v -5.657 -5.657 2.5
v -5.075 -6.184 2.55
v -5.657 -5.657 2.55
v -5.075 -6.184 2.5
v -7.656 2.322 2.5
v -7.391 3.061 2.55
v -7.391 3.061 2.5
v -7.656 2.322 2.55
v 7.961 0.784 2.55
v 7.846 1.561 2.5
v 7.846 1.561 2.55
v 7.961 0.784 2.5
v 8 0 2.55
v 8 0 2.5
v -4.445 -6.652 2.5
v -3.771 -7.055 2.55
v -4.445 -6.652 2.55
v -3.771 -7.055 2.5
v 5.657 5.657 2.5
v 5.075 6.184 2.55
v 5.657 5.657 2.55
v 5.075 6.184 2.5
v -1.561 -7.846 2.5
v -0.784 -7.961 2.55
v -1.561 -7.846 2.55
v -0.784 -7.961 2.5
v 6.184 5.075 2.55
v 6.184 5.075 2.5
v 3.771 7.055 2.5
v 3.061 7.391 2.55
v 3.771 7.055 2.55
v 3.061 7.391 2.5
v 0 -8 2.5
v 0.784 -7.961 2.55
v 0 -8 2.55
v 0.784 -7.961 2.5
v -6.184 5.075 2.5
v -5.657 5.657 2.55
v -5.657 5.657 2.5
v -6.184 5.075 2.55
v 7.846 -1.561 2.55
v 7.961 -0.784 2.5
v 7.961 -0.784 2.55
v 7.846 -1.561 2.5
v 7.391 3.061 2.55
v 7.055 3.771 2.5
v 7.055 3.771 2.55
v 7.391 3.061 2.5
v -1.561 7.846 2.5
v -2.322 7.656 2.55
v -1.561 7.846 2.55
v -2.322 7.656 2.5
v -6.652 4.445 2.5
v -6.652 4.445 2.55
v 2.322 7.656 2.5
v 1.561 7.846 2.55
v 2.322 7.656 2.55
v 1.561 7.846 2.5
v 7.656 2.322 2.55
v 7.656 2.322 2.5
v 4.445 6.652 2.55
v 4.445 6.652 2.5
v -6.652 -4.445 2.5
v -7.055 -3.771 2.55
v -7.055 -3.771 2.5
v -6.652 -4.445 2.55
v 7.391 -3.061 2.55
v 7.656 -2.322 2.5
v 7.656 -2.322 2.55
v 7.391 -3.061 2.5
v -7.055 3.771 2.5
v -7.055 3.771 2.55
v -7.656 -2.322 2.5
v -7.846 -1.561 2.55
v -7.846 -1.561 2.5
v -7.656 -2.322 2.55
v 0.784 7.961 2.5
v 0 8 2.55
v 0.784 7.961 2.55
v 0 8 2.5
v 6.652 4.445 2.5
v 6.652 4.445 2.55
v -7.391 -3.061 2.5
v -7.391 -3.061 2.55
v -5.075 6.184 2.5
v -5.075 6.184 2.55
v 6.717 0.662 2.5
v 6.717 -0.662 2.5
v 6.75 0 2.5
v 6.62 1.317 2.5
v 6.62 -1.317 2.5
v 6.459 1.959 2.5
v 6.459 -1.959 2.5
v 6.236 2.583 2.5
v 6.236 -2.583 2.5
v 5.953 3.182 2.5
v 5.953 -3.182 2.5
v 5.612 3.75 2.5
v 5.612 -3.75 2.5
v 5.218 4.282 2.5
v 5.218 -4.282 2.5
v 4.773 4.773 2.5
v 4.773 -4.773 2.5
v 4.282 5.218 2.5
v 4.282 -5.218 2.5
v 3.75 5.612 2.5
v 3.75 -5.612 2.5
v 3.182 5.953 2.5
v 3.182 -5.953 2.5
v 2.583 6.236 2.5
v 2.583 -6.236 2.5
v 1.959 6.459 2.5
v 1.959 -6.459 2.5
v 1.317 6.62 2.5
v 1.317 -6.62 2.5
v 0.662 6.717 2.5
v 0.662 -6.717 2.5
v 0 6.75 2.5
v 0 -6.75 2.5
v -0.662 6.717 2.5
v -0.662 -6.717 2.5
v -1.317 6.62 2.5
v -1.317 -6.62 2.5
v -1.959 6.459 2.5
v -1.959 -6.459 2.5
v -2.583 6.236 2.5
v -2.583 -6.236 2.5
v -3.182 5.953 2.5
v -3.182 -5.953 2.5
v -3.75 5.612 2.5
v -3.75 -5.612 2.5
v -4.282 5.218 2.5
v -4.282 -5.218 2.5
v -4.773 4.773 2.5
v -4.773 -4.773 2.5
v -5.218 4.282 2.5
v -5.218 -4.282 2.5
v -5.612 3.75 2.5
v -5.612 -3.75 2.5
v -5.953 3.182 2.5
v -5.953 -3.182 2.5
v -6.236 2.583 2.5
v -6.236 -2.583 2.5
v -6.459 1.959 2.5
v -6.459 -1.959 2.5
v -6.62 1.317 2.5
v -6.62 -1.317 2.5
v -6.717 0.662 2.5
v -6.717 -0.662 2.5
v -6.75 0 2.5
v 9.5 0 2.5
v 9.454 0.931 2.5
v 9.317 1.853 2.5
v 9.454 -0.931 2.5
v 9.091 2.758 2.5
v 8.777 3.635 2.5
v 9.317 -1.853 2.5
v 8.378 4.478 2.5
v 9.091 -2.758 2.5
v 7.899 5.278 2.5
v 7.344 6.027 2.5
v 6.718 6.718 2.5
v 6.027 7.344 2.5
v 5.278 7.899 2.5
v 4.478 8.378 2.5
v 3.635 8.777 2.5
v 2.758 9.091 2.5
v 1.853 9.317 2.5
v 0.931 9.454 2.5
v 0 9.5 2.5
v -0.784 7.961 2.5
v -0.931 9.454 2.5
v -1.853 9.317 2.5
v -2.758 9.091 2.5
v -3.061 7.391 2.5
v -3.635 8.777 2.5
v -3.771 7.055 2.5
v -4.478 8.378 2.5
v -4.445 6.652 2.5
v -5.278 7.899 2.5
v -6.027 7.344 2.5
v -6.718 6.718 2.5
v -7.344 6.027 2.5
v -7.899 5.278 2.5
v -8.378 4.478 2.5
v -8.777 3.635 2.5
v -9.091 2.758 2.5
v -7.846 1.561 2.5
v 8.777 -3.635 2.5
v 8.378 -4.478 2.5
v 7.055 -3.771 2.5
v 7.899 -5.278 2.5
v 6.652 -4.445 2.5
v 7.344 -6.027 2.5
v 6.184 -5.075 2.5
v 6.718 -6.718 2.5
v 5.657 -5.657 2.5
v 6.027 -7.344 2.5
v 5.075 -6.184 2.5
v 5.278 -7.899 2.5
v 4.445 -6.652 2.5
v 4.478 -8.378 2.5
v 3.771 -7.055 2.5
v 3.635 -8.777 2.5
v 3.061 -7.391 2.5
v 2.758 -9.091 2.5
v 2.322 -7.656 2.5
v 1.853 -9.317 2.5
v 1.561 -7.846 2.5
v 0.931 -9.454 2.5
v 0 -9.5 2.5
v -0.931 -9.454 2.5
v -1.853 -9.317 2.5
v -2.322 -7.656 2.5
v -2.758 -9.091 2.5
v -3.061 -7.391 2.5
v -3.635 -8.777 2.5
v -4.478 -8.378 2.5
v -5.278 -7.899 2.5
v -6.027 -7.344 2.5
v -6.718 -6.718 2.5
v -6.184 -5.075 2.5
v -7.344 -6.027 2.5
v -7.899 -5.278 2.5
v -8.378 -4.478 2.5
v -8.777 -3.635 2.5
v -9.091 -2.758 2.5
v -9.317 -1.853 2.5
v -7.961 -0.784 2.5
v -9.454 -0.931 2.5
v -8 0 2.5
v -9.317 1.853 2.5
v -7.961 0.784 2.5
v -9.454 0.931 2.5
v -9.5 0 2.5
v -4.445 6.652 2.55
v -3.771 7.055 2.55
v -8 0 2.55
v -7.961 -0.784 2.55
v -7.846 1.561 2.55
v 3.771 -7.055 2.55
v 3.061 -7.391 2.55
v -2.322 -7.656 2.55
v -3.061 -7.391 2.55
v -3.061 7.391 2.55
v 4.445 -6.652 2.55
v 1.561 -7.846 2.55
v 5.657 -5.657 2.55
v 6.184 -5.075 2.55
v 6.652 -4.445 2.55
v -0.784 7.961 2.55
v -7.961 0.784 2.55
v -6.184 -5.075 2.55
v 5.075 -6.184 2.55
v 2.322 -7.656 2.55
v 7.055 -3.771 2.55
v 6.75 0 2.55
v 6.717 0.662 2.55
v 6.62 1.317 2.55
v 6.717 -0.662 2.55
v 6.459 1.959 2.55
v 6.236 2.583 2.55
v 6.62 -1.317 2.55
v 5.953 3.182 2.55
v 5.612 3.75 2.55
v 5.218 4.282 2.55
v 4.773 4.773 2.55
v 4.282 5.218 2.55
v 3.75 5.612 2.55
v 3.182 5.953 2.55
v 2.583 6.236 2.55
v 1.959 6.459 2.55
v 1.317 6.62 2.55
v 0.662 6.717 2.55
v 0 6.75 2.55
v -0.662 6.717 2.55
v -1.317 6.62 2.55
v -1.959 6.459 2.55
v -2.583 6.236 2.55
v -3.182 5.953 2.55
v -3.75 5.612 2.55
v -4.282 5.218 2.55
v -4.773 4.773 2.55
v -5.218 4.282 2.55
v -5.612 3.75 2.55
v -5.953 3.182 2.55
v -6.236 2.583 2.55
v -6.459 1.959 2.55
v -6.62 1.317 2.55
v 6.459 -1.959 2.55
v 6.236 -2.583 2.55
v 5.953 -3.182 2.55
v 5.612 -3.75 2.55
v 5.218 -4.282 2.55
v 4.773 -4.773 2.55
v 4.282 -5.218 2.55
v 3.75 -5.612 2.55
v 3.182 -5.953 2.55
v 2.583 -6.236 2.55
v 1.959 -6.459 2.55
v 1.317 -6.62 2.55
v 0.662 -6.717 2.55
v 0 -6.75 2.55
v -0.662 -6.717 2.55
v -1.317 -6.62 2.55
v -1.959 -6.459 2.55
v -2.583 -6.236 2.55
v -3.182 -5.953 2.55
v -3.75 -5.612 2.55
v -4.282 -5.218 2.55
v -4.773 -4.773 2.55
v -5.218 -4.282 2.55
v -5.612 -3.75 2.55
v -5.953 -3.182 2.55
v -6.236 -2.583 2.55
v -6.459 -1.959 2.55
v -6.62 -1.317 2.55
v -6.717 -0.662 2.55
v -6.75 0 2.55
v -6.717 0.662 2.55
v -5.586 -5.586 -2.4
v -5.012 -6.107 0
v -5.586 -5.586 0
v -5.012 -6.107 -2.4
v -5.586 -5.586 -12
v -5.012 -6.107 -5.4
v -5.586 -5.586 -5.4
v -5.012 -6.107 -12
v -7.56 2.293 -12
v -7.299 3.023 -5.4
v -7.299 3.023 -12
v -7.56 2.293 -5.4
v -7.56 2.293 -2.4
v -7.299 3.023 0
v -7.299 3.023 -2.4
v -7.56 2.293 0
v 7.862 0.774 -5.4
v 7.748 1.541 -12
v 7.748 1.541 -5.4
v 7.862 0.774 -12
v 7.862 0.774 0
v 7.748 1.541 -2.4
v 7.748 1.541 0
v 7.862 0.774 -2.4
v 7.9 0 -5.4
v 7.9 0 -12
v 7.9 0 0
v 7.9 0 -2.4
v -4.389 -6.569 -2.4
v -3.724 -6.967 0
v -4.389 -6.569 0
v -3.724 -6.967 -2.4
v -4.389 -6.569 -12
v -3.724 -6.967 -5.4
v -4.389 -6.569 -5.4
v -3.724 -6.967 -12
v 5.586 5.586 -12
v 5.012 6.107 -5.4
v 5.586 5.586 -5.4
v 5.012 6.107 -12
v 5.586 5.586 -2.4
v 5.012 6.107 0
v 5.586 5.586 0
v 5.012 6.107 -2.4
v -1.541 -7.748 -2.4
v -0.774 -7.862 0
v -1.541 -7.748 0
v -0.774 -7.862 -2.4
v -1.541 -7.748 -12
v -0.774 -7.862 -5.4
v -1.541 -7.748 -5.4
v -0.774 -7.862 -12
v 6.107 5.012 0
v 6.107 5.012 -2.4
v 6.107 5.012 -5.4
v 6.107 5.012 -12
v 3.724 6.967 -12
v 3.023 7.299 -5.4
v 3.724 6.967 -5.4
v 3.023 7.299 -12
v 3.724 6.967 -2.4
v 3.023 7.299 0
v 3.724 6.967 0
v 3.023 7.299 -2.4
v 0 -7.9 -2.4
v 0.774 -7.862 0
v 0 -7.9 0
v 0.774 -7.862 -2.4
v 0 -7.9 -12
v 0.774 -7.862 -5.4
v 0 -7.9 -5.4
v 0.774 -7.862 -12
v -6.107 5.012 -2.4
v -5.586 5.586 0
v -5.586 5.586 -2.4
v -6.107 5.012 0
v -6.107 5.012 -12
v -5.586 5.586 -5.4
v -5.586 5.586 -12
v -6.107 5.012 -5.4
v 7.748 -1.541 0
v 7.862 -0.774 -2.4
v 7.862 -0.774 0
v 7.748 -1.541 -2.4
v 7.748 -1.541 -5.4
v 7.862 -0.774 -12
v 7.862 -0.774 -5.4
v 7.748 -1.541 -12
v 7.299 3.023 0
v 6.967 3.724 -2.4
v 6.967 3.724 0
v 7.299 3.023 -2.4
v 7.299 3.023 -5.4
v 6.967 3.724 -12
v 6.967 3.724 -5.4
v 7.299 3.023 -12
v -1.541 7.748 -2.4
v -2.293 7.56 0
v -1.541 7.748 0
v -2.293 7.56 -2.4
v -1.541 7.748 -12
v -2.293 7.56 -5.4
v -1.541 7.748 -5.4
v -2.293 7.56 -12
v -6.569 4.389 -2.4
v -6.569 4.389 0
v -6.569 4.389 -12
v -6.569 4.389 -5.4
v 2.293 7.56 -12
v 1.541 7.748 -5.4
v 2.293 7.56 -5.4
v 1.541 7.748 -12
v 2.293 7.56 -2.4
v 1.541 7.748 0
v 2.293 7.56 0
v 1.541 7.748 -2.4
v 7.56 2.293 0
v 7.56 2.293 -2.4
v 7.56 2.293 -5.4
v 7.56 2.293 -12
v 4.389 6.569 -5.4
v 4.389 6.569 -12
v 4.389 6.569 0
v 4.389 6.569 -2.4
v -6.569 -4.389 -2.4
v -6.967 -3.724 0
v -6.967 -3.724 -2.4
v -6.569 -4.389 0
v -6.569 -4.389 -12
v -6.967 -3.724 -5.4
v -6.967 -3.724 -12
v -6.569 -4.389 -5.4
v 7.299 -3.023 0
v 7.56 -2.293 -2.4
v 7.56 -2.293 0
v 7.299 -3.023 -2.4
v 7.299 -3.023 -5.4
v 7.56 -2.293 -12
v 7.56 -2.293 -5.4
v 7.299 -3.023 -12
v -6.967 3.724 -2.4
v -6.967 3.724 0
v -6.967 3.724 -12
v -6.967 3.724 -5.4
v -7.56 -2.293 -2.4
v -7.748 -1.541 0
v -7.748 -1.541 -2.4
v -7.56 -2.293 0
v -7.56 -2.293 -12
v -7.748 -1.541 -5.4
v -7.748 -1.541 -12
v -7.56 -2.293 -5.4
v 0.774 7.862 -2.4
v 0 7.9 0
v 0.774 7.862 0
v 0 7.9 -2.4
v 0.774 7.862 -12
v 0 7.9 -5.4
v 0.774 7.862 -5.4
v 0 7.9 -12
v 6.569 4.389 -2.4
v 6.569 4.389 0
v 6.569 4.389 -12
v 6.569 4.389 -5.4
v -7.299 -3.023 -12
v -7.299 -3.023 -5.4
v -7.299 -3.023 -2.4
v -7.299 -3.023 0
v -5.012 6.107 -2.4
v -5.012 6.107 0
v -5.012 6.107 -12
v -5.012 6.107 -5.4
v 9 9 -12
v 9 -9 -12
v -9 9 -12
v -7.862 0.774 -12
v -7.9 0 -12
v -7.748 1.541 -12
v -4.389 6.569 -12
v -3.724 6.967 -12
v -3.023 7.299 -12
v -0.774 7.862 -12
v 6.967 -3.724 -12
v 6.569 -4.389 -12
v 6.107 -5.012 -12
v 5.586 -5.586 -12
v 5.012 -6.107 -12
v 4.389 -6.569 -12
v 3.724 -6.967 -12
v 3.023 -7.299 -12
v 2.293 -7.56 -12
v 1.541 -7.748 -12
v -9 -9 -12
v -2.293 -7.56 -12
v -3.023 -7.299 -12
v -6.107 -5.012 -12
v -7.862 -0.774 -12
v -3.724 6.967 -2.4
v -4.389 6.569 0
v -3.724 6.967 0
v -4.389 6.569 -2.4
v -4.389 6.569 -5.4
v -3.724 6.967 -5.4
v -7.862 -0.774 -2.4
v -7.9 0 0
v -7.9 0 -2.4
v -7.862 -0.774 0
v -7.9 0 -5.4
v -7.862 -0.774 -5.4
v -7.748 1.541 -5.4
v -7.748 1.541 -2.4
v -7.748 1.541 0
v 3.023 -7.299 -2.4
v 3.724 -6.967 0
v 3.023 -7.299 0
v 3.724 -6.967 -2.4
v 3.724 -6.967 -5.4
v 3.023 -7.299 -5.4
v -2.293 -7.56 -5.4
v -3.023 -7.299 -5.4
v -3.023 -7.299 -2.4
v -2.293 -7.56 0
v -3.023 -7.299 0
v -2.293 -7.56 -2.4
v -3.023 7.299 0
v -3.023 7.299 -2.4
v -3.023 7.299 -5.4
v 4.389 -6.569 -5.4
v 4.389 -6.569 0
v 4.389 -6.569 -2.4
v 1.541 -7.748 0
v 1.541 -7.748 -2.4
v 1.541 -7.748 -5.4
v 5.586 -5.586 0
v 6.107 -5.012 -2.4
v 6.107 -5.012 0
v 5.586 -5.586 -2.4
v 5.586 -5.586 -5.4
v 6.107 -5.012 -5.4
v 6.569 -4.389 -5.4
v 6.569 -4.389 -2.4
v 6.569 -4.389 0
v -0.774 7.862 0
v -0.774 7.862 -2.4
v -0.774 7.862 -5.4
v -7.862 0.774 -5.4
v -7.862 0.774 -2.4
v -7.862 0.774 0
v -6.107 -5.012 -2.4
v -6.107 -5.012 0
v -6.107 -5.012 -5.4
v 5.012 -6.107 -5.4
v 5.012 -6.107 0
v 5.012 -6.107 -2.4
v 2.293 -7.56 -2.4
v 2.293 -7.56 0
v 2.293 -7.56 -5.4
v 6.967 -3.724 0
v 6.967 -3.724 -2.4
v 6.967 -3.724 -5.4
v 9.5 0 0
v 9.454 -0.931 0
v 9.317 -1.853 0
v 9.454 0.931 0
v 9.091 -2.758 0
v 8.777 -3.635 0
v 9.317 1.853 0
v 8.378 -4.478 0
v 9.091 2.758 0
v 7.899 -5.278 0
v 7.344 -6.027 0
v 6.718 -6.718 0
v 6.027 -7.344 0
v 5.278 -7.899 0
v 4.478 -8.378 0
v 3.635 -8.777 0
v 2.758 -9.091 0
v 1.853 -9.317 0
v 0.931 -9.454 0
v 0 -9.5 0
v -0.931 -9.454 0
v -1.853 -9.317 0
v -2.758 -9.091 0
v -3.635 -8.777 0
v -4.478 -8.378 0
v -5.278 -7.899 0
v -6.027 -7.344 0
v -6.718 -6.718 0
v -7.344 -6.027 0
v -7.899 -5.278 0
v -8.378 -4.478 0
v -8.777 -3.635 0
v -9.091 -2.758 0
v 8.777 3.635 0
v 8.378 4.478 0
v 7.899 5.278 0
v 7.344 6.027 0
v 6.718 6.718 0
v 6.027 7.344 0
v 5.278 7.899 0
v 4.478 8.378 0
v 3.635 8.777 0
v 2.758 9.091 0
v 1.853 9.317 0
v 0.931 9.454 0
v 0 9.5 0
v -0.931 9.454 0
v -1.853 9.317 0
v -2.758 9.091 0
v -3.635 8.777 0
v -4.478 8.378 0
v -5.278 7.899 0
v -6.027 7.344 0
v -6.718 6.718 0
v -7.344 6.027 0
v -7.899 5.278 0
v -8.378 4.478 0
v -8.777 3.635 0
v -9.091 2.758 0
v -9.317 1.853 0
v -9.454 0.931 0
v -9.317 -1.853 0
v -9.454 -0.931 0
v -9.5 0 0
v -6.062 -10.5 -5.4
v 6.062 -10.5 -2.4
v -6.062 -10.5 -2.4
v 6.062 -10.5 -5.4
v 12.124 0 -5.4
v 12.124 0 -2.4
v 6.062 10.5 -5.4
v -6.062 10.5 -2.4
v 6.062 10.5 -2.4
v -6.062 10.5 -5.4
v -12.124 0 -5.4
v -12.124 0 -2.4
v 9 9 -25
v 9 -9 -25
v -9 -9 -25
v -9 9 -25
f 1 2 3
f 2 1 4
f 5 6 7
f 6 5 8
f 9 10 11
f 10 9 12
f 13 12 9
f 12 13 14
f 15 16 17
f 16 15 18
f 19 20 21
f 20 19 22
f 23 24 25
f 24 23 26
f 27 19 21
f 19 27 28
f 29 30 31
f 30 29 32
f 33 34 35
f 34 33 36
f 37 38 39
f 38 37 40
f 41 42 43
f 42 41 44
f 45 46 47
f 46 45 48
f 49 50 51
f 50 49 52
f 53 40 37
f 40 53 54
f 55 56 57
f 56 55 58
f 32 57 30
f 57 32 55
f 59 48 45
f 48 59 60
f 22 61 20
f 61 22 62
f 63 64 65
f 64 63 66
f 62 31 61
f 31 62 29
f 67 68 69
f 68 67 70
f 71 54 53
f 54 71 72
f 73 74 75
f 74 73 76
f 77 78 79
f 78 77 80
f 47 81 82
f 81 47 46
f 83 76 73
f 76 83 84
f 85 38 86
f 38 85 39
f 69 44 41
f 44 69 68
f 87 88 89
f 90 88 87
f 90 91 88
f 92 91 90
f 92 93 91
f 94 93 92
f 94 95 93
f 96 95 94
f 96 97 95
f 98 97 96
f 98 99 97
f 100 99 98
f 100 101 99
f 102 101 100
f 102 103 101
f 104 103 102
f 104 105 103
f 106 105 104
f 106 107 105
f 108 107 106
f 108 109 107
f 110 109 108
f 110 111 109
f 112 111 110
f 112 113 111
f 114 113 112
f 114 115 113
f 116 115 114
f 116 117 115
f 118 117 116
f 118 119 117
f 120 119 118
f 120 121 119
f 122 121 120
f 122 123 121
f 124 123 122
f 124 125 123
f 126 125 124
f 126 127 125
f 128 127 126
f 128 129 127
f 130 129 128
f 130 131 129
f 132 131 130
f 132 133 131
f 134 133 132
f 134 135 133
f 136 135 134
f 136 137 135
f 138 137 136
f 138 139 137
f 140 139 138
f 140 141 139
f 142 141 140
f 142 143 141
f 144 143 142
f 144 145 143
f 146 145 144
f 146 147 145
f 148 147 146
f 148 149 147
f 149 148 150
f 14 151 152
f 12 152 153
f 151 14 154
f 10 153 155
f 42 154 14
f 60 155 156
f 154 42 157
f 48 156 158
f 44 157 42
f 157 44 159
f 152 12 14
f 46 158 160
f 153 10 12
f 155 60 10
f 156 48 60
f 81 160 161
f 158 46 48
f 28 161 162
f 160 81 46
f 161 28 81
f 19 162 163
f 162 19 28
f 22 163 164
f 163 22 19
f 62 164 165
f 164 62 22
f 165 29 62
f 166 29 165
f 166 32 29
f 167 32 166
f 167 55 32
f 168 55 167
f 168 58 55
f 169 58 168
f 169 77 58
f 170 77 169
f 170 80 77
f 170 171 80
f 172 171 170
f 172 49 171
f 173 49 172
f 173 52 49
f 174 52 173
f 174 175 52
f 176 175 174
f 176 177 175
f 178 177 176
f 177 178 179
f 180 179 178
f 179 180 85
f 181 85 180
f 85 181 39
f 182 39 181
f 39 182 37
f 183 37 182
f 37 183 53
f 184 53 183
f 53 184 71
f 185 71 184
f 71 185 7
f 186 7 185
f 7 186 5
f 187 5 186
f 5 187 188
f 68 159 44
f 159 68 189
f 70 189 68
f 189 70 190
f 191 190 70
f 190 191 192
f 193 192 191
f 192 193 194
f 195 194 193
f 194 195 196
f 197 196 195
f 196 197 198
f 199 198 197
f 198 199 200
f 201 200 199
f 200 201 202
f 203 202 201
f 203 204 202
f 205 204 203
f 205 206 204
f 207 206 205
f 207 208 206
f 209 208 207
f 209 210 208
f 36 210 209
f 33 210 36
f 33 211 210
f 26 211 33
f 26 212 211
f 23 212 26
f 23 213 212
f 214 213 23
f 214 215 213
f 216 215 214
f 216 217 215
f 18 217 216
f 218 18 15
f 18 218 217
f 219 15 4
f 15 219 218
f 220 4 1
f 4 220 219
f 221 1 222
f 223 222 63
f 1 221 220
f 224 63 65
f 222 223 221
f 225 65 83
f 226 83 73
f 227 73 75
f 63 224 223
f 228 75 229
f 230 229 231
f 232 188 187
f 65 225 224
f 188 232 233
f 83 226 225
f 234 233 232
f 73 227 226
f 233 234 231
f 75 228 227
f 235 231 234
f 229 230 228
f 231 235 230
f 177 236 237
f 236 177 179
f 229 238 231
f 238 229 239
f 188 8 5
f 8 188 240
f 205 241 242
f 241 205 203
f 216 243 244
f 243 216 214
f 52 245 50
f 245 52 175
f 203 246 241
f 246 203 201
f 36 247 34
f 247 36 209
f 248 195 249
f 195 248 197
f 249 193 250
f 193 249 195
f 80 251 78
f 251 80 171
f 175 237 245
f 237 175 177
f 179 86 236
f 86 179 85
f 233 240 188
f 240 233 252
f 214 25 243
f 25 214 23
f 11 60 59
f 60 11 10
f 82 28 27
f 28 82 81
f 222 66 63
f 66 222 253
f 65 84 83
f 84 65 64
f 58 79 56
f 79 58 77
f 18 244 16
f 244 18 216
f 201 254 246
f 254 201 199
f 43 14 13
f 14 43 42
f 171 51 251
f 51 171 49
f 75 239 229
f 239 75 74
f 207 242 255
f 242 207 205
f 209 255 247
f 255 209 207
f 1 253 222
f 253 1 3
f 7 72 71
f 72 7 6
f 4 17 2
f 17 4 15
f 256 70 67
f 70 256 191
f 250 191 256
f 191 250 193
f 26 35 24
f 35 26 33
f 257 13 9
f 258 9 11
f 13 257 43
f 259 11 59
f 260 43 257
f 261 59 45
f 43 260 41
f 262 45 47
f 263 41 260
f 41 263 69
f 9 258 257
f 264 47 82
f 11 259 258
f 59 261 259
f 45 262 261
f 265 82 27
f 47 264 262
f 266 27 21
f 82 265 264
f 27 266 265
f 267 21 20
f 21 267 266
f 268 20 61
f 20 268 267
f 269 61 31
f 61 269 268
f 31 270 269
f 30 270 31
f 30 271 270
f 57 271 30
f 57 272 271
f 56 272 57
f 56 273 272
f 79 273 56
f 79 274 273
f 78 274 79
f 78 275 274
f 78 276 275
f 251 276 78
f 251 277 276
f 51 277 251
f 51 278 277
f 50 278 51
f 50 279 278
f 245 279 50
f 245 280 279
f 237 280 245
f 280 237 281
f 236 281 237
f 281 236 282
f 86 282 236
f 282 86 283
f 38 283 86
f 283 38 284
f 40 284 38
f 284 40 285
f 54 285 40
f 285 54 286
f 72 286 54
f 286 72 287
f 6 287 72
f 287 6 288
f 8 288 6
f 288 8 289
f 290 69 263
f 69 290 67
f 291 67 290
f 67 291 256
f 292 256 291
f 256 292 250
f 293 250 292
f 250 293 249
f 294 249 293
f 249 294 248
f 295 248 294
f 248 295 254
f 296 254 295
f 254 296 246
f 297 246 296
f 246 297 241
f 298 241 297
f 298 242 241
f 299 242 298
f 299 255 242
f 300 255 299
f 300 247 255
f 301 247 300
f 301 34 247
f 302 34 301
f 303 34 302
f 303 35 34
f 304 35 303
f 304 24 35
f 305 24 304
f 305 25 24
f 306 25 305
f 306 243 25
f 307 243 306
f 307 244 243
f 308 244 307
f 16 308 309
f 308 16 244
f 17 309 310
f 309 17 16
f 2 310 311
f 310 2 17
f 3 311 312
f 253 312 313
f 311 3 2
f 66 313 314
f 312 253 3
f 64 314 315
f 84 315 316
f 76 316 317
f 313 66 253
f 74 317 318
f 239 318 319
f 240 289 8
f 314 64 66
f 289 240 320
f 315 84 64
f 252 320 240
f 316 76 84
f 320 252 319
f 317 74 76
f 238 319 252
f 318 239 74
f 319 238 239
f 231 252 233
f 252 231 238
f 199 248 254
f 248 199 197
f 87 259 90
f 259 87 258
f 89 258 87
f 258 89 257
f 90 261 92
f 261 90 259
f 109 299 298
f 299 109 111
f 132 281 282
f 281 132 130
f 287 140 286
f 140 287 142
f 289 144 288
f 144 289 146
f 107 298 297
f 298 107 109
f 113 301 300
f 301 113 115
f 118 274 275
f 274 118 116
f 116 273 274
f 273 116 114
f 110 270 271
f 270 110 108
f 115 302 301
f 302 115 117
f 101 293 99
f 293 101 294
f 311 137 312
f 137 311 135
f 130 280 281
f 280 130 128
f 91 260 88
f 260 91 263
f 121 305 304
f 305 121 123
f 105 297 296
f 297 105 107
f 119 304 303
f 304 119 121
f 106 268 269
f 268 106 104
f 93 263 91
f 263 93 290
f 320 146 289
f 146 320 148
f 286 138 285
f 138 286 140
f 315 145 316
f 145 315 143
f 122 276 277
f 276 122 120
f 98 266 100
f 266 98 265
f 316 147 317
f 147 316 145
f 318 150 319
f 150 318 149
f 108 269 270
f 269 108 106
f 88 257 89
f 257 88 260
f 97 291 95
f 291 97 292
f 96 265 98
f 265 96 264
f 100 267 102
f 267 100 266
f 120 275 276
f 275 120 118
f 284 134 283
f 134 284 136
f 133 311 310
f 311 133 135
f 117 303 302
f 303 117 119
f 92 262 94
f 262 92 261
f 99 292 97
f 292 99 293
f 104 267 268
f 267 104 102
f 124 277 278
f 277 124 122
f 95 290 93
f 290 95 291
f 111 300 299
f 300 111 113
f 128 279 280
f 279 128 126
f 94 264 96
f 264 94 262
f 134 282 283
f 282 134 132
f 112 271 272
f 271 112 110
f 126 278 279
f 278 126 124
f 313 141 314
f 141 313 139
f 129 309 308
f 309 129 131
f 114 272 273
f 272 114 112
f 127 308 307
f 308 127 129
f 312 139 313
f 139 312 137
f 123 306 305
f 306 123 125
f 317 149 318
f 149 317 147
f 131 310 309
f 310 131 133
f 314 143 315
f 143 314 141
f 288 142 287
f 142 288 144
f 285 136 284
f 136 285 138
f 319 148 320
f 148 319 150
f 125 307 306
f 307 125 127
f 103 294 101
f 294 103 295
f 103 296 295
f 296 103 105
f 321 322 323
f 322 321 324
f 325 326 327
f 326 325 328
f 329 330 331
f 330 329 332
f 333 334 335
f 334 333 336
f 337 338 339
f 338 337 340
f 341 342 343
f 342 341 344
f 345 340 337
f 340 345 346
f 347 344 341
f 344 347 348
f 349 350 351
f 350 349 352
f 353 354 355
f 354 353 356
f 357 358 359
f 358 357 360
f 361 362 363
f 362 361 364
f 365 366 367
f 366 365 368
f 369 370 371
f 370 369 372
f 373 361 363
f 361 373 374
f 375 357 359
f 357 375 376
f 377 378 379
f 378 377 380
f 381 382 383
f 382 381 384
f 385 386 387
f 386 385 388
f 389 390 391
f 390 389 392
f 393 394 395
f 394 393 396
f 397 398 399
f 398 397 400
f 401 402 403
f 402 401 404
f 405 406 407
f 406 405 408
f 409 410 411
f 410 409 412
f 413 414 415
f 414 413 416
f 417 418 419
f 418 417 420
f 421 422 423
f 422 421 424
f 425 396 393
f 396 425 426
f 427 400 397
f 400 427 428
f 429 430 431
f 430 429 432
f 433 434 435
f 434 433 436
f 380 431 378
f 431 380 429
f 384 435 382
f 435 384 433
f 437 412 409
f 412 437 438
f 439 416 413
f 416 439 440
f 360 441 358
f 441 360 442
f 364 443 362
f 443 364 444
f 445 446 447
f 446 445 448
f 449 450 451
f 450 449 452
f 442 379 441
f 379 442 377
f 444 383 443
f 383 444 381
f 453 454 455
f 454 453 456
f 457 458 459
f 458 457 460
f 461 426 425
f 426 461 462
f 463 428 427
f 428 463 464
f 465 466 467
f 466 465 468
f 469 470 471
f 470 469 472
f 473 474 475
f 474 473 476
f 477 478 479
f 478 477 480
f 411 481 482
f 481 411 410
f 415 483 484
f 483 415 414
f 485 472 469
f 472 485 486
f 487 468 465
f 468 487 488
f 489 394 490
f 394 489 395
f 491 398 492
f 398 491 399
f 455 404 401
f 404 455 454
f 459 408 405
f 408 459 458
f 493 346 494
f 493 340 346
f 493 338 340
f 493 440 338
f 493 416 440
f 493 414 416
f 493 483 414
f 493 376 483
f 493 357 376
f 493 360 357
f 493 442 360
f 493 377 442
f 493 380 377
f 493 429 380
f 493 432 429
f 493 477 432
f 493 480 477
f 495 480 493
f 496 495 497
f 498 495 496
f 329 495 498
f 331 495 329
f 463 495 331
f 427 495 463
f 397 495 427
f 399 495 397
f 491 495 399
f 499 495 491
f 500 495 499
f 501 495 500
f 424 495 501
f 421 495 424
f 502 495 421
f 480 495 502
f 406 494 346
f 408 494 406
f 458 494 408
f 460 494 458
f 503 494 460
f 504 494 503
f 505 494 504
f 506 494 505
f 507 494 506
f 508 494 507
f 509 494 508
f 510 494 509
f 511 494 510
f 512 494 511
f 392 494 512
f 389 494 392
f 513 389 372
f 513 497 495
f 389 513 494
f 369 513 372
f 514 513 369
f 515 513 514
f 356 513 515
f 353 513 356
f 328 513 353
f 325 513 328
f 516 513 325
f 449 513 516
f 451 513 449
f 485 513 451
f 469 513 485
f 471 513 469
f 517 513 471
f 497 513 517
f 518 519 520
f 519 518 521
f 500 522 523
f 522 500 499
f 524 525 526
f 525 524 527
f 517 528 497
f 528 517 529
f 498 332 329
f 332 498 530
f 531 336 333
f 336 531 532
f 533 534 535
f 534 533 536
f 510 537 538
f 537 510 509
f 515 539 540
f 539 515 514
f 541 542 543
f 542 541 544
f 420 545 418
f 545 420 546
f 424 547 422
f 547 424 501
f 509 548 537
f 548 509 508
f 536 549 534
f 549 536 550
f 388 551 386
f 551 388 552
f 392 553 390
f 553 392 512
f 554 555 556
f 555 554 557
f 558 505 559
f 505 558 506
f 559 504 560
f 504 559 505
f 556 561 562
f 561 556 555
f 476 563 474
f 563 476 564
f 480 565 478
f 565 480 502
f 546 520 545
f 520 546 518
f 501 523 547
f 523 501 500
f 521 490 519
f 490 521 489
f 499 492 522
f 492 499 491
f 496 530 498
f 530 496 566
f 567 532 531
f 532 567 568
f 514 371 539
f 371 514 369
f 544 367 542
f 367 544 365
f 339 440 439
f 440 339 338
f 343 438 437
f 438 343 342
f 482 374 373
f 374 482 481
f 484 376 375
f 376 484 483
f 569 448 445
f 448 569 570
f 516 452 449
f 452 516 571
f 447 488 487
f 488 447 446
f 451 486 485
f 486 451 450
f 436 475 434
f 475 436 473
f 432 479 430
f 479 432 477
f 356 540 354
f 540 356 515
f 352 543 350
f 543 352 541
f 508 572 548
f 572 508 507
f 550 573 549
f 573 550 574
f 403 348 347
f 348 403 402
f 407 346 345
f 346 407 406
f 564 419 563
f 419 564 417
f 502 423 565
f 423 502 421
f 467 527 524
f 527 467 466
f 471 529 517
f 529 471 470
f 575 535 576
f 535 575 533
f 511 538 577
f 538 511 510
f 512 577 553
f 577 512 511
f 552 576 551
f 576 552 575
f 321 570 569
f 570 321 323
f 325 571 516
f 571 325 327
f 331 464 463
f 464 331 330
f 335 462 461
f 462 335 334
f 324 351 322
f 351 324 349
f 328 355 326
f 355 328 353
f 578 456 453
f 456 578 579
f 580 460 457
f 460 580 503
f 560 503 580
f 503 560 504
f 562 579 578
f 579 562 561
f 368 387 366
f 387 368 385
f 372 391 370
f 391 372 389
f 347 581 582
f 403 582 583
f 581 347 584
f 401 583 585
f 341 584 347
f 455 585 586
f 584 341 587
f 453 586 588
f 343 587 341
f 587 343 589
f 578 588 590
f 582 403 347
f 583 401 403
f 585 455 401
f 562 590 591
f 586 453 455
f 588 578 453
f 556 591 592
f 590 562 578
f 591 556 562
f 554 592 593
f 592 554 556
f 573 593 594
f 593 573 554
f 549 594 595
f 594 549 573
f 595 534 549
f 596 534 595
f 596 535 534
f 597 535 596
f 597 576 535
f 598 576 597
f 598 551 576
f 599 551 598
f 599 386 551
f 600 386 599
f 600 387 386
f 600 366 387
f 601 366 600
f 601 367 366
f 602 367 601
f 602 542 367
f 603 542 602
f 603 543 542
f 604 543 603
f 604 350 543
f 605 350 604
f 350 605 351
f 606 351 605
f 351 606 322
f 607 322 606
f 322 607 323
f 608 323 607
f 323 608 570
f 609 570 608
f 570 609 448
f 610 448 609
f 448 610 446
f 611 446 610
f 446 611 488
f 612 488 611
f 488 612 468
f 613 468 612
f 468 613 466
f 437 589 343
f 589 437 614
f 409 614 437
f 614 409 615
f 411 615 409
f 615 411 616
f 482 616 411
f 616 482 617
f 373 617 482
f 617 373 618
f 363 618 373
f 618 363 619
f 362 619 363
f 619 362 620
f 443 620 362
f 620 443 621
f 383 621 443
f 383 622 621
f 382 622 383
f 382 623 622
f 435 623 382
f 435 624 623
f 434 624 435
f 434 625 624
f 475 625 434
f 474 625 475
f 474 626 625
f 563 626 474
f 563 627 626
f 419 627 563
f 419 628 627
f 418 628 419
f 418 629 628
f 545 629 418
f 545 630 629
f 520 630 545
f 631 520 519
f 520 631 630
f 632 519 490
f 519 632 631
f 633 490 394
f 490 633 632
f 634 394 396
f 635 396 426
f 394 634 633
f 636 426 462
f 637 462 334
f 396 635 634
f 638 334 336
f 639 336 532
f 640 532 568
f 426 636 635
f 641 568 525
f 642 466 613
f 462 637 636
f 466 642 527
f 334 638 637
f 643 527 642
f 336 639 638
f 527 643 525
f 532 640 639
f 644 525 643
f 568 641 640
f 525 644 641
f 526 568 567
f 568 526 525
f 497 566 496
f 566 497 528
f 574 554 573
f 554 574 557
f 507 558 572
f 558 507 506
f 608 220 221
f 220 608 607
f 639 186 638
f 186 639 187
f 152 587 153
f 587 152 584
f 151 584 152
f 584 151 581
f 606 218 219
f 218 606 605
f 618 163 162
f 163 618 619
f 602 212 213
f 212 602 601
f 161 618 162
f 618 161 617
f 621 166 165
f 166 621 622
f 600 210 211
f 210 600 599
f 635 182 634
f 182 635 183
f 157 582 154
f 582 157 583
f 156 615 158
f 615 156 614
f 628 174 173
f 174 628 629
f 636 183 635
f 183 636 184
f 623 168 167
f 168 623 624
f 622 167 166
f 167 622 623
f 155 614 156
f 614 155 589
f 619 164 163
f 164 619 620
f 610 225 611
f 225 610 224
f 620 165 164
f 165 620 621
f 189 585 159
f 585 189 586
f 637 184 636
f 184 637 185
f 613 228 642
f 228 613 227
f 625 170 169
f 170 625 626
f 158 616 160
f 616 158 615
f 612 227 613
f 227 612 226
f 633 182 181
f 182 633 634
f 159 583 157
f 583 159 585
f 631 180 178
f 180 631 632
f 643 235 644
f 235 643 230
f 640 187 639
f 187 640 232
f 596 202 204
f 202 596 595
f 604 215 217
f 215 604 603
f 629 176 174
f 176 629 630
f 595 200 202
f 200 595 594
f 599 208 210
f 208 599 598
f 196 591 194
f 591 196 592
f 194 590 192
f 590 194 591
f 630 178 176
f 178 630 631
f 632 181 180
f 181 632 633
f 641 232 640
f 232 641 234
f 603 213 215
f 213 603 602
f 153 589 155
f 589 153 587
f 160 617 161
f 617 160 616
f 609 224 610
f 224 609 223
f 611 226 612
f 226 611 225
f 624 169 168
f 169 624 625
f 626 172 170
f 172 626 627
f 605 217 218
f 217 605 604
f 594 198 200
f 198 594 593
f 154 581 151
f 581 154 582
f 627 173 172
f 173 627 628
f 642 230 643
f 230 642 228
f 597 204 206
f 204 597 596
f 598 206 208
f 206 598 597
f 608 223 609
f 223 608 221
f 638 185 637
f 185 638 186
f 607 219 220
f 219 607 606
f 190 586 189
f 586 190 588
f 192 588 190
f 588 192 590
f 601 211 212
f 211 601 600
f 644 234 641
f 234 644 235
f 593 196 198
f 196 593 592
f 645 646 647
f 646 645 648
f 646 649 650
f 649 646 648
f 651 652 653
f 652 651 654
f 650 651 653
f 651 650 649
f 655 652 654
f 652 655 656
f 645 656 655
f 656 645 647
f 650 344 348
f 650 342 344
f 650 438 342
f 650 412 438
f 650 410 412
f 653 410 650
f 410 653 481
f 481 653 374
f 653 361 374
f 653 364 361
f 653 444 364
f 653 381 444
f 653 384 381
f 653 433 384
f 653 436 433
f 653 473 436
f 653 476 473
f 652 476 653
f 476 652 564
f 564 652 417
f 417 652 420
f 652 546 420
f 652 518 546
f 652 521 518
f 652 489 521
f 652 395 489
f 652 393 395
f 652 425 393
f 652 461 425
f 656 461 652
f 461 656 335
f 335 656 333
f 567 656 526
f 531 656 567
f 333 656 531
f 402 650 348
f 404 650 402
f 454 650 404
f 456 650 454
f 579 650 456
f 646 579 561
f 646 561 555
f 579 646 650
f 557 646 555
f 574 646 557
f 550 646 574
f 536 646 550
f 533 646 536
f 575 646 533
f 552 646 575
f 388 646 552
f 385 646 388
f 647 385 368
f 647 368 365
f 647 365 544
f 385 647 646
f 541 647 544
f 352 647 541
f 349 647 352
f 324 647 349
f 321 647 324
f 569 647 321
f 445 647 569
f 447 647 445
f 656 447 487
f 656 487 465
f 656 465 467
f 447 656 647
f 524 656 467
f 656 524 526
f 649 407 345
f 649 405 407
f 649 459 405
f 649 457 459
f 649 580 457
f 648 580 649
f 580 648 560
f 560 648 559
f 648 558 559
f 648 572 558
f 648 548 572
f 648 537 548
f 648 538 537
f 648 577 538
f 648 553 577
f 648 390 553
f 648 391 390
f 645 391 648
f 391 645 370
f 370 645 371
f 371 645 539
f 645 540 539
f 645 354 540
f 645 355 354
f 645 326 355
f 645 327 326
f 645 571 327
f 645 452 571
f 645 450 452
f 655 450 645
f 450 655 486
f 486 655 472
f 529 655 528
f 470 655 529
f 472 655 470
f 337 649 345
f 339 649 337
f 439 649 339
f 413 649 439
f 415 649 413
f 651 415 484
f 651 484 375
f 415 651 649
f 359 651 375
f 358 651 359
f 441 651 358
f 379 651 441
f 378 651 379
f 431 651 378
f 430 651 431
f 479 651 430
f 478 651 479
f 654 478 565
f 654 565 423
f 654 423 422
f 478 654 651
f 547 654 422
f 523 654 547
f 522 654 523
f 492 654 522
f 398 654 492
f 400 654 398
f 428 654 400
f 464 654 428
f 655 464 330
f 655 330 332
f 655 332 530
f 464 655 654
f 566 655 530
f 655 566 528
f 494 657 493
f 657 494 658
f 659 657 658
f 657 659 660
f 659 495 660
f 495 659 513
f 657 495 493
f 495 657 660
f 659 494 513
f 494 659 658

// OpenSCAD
include <../common.scad>
// Envelope and visual ring parameters are named in common.scad.
// Origin is panel OUTER face; positive z points toward user.
module button_hban(panel_t=button_reference_panel_t){
 color([0.55,0.57,0.59])translate([0,0,-button_body_depth])cylinder(d=button_body_d,h=button_body_depth);
 color([0.65,0.67,0.69])cylinder(d=button_head_d,h=button_head_h);
 color(signal_red)translate([0,0,button_head_h])difference(){cylinder(d=button_ring_outer_d,h=button_ring_t);translate([0,0,-eps])cylinder(d=button_ring_inner_d,h=2*button_ring_t);}
 color([0.44,0.46,0.48])translate([0,0,-panel_t-button_nut_h])cylinder(d=button_nut_af/cos(30),h=button_nut_h,$fn=6);
 color([0.06,0.06,0.07])translate([-button_plug_w/2,-button_plug_w/2,-button_plug_depth])cube([button_plug_w,button_plug_w,button_plug_depth-button_body_depth]);
}
button_hban();
